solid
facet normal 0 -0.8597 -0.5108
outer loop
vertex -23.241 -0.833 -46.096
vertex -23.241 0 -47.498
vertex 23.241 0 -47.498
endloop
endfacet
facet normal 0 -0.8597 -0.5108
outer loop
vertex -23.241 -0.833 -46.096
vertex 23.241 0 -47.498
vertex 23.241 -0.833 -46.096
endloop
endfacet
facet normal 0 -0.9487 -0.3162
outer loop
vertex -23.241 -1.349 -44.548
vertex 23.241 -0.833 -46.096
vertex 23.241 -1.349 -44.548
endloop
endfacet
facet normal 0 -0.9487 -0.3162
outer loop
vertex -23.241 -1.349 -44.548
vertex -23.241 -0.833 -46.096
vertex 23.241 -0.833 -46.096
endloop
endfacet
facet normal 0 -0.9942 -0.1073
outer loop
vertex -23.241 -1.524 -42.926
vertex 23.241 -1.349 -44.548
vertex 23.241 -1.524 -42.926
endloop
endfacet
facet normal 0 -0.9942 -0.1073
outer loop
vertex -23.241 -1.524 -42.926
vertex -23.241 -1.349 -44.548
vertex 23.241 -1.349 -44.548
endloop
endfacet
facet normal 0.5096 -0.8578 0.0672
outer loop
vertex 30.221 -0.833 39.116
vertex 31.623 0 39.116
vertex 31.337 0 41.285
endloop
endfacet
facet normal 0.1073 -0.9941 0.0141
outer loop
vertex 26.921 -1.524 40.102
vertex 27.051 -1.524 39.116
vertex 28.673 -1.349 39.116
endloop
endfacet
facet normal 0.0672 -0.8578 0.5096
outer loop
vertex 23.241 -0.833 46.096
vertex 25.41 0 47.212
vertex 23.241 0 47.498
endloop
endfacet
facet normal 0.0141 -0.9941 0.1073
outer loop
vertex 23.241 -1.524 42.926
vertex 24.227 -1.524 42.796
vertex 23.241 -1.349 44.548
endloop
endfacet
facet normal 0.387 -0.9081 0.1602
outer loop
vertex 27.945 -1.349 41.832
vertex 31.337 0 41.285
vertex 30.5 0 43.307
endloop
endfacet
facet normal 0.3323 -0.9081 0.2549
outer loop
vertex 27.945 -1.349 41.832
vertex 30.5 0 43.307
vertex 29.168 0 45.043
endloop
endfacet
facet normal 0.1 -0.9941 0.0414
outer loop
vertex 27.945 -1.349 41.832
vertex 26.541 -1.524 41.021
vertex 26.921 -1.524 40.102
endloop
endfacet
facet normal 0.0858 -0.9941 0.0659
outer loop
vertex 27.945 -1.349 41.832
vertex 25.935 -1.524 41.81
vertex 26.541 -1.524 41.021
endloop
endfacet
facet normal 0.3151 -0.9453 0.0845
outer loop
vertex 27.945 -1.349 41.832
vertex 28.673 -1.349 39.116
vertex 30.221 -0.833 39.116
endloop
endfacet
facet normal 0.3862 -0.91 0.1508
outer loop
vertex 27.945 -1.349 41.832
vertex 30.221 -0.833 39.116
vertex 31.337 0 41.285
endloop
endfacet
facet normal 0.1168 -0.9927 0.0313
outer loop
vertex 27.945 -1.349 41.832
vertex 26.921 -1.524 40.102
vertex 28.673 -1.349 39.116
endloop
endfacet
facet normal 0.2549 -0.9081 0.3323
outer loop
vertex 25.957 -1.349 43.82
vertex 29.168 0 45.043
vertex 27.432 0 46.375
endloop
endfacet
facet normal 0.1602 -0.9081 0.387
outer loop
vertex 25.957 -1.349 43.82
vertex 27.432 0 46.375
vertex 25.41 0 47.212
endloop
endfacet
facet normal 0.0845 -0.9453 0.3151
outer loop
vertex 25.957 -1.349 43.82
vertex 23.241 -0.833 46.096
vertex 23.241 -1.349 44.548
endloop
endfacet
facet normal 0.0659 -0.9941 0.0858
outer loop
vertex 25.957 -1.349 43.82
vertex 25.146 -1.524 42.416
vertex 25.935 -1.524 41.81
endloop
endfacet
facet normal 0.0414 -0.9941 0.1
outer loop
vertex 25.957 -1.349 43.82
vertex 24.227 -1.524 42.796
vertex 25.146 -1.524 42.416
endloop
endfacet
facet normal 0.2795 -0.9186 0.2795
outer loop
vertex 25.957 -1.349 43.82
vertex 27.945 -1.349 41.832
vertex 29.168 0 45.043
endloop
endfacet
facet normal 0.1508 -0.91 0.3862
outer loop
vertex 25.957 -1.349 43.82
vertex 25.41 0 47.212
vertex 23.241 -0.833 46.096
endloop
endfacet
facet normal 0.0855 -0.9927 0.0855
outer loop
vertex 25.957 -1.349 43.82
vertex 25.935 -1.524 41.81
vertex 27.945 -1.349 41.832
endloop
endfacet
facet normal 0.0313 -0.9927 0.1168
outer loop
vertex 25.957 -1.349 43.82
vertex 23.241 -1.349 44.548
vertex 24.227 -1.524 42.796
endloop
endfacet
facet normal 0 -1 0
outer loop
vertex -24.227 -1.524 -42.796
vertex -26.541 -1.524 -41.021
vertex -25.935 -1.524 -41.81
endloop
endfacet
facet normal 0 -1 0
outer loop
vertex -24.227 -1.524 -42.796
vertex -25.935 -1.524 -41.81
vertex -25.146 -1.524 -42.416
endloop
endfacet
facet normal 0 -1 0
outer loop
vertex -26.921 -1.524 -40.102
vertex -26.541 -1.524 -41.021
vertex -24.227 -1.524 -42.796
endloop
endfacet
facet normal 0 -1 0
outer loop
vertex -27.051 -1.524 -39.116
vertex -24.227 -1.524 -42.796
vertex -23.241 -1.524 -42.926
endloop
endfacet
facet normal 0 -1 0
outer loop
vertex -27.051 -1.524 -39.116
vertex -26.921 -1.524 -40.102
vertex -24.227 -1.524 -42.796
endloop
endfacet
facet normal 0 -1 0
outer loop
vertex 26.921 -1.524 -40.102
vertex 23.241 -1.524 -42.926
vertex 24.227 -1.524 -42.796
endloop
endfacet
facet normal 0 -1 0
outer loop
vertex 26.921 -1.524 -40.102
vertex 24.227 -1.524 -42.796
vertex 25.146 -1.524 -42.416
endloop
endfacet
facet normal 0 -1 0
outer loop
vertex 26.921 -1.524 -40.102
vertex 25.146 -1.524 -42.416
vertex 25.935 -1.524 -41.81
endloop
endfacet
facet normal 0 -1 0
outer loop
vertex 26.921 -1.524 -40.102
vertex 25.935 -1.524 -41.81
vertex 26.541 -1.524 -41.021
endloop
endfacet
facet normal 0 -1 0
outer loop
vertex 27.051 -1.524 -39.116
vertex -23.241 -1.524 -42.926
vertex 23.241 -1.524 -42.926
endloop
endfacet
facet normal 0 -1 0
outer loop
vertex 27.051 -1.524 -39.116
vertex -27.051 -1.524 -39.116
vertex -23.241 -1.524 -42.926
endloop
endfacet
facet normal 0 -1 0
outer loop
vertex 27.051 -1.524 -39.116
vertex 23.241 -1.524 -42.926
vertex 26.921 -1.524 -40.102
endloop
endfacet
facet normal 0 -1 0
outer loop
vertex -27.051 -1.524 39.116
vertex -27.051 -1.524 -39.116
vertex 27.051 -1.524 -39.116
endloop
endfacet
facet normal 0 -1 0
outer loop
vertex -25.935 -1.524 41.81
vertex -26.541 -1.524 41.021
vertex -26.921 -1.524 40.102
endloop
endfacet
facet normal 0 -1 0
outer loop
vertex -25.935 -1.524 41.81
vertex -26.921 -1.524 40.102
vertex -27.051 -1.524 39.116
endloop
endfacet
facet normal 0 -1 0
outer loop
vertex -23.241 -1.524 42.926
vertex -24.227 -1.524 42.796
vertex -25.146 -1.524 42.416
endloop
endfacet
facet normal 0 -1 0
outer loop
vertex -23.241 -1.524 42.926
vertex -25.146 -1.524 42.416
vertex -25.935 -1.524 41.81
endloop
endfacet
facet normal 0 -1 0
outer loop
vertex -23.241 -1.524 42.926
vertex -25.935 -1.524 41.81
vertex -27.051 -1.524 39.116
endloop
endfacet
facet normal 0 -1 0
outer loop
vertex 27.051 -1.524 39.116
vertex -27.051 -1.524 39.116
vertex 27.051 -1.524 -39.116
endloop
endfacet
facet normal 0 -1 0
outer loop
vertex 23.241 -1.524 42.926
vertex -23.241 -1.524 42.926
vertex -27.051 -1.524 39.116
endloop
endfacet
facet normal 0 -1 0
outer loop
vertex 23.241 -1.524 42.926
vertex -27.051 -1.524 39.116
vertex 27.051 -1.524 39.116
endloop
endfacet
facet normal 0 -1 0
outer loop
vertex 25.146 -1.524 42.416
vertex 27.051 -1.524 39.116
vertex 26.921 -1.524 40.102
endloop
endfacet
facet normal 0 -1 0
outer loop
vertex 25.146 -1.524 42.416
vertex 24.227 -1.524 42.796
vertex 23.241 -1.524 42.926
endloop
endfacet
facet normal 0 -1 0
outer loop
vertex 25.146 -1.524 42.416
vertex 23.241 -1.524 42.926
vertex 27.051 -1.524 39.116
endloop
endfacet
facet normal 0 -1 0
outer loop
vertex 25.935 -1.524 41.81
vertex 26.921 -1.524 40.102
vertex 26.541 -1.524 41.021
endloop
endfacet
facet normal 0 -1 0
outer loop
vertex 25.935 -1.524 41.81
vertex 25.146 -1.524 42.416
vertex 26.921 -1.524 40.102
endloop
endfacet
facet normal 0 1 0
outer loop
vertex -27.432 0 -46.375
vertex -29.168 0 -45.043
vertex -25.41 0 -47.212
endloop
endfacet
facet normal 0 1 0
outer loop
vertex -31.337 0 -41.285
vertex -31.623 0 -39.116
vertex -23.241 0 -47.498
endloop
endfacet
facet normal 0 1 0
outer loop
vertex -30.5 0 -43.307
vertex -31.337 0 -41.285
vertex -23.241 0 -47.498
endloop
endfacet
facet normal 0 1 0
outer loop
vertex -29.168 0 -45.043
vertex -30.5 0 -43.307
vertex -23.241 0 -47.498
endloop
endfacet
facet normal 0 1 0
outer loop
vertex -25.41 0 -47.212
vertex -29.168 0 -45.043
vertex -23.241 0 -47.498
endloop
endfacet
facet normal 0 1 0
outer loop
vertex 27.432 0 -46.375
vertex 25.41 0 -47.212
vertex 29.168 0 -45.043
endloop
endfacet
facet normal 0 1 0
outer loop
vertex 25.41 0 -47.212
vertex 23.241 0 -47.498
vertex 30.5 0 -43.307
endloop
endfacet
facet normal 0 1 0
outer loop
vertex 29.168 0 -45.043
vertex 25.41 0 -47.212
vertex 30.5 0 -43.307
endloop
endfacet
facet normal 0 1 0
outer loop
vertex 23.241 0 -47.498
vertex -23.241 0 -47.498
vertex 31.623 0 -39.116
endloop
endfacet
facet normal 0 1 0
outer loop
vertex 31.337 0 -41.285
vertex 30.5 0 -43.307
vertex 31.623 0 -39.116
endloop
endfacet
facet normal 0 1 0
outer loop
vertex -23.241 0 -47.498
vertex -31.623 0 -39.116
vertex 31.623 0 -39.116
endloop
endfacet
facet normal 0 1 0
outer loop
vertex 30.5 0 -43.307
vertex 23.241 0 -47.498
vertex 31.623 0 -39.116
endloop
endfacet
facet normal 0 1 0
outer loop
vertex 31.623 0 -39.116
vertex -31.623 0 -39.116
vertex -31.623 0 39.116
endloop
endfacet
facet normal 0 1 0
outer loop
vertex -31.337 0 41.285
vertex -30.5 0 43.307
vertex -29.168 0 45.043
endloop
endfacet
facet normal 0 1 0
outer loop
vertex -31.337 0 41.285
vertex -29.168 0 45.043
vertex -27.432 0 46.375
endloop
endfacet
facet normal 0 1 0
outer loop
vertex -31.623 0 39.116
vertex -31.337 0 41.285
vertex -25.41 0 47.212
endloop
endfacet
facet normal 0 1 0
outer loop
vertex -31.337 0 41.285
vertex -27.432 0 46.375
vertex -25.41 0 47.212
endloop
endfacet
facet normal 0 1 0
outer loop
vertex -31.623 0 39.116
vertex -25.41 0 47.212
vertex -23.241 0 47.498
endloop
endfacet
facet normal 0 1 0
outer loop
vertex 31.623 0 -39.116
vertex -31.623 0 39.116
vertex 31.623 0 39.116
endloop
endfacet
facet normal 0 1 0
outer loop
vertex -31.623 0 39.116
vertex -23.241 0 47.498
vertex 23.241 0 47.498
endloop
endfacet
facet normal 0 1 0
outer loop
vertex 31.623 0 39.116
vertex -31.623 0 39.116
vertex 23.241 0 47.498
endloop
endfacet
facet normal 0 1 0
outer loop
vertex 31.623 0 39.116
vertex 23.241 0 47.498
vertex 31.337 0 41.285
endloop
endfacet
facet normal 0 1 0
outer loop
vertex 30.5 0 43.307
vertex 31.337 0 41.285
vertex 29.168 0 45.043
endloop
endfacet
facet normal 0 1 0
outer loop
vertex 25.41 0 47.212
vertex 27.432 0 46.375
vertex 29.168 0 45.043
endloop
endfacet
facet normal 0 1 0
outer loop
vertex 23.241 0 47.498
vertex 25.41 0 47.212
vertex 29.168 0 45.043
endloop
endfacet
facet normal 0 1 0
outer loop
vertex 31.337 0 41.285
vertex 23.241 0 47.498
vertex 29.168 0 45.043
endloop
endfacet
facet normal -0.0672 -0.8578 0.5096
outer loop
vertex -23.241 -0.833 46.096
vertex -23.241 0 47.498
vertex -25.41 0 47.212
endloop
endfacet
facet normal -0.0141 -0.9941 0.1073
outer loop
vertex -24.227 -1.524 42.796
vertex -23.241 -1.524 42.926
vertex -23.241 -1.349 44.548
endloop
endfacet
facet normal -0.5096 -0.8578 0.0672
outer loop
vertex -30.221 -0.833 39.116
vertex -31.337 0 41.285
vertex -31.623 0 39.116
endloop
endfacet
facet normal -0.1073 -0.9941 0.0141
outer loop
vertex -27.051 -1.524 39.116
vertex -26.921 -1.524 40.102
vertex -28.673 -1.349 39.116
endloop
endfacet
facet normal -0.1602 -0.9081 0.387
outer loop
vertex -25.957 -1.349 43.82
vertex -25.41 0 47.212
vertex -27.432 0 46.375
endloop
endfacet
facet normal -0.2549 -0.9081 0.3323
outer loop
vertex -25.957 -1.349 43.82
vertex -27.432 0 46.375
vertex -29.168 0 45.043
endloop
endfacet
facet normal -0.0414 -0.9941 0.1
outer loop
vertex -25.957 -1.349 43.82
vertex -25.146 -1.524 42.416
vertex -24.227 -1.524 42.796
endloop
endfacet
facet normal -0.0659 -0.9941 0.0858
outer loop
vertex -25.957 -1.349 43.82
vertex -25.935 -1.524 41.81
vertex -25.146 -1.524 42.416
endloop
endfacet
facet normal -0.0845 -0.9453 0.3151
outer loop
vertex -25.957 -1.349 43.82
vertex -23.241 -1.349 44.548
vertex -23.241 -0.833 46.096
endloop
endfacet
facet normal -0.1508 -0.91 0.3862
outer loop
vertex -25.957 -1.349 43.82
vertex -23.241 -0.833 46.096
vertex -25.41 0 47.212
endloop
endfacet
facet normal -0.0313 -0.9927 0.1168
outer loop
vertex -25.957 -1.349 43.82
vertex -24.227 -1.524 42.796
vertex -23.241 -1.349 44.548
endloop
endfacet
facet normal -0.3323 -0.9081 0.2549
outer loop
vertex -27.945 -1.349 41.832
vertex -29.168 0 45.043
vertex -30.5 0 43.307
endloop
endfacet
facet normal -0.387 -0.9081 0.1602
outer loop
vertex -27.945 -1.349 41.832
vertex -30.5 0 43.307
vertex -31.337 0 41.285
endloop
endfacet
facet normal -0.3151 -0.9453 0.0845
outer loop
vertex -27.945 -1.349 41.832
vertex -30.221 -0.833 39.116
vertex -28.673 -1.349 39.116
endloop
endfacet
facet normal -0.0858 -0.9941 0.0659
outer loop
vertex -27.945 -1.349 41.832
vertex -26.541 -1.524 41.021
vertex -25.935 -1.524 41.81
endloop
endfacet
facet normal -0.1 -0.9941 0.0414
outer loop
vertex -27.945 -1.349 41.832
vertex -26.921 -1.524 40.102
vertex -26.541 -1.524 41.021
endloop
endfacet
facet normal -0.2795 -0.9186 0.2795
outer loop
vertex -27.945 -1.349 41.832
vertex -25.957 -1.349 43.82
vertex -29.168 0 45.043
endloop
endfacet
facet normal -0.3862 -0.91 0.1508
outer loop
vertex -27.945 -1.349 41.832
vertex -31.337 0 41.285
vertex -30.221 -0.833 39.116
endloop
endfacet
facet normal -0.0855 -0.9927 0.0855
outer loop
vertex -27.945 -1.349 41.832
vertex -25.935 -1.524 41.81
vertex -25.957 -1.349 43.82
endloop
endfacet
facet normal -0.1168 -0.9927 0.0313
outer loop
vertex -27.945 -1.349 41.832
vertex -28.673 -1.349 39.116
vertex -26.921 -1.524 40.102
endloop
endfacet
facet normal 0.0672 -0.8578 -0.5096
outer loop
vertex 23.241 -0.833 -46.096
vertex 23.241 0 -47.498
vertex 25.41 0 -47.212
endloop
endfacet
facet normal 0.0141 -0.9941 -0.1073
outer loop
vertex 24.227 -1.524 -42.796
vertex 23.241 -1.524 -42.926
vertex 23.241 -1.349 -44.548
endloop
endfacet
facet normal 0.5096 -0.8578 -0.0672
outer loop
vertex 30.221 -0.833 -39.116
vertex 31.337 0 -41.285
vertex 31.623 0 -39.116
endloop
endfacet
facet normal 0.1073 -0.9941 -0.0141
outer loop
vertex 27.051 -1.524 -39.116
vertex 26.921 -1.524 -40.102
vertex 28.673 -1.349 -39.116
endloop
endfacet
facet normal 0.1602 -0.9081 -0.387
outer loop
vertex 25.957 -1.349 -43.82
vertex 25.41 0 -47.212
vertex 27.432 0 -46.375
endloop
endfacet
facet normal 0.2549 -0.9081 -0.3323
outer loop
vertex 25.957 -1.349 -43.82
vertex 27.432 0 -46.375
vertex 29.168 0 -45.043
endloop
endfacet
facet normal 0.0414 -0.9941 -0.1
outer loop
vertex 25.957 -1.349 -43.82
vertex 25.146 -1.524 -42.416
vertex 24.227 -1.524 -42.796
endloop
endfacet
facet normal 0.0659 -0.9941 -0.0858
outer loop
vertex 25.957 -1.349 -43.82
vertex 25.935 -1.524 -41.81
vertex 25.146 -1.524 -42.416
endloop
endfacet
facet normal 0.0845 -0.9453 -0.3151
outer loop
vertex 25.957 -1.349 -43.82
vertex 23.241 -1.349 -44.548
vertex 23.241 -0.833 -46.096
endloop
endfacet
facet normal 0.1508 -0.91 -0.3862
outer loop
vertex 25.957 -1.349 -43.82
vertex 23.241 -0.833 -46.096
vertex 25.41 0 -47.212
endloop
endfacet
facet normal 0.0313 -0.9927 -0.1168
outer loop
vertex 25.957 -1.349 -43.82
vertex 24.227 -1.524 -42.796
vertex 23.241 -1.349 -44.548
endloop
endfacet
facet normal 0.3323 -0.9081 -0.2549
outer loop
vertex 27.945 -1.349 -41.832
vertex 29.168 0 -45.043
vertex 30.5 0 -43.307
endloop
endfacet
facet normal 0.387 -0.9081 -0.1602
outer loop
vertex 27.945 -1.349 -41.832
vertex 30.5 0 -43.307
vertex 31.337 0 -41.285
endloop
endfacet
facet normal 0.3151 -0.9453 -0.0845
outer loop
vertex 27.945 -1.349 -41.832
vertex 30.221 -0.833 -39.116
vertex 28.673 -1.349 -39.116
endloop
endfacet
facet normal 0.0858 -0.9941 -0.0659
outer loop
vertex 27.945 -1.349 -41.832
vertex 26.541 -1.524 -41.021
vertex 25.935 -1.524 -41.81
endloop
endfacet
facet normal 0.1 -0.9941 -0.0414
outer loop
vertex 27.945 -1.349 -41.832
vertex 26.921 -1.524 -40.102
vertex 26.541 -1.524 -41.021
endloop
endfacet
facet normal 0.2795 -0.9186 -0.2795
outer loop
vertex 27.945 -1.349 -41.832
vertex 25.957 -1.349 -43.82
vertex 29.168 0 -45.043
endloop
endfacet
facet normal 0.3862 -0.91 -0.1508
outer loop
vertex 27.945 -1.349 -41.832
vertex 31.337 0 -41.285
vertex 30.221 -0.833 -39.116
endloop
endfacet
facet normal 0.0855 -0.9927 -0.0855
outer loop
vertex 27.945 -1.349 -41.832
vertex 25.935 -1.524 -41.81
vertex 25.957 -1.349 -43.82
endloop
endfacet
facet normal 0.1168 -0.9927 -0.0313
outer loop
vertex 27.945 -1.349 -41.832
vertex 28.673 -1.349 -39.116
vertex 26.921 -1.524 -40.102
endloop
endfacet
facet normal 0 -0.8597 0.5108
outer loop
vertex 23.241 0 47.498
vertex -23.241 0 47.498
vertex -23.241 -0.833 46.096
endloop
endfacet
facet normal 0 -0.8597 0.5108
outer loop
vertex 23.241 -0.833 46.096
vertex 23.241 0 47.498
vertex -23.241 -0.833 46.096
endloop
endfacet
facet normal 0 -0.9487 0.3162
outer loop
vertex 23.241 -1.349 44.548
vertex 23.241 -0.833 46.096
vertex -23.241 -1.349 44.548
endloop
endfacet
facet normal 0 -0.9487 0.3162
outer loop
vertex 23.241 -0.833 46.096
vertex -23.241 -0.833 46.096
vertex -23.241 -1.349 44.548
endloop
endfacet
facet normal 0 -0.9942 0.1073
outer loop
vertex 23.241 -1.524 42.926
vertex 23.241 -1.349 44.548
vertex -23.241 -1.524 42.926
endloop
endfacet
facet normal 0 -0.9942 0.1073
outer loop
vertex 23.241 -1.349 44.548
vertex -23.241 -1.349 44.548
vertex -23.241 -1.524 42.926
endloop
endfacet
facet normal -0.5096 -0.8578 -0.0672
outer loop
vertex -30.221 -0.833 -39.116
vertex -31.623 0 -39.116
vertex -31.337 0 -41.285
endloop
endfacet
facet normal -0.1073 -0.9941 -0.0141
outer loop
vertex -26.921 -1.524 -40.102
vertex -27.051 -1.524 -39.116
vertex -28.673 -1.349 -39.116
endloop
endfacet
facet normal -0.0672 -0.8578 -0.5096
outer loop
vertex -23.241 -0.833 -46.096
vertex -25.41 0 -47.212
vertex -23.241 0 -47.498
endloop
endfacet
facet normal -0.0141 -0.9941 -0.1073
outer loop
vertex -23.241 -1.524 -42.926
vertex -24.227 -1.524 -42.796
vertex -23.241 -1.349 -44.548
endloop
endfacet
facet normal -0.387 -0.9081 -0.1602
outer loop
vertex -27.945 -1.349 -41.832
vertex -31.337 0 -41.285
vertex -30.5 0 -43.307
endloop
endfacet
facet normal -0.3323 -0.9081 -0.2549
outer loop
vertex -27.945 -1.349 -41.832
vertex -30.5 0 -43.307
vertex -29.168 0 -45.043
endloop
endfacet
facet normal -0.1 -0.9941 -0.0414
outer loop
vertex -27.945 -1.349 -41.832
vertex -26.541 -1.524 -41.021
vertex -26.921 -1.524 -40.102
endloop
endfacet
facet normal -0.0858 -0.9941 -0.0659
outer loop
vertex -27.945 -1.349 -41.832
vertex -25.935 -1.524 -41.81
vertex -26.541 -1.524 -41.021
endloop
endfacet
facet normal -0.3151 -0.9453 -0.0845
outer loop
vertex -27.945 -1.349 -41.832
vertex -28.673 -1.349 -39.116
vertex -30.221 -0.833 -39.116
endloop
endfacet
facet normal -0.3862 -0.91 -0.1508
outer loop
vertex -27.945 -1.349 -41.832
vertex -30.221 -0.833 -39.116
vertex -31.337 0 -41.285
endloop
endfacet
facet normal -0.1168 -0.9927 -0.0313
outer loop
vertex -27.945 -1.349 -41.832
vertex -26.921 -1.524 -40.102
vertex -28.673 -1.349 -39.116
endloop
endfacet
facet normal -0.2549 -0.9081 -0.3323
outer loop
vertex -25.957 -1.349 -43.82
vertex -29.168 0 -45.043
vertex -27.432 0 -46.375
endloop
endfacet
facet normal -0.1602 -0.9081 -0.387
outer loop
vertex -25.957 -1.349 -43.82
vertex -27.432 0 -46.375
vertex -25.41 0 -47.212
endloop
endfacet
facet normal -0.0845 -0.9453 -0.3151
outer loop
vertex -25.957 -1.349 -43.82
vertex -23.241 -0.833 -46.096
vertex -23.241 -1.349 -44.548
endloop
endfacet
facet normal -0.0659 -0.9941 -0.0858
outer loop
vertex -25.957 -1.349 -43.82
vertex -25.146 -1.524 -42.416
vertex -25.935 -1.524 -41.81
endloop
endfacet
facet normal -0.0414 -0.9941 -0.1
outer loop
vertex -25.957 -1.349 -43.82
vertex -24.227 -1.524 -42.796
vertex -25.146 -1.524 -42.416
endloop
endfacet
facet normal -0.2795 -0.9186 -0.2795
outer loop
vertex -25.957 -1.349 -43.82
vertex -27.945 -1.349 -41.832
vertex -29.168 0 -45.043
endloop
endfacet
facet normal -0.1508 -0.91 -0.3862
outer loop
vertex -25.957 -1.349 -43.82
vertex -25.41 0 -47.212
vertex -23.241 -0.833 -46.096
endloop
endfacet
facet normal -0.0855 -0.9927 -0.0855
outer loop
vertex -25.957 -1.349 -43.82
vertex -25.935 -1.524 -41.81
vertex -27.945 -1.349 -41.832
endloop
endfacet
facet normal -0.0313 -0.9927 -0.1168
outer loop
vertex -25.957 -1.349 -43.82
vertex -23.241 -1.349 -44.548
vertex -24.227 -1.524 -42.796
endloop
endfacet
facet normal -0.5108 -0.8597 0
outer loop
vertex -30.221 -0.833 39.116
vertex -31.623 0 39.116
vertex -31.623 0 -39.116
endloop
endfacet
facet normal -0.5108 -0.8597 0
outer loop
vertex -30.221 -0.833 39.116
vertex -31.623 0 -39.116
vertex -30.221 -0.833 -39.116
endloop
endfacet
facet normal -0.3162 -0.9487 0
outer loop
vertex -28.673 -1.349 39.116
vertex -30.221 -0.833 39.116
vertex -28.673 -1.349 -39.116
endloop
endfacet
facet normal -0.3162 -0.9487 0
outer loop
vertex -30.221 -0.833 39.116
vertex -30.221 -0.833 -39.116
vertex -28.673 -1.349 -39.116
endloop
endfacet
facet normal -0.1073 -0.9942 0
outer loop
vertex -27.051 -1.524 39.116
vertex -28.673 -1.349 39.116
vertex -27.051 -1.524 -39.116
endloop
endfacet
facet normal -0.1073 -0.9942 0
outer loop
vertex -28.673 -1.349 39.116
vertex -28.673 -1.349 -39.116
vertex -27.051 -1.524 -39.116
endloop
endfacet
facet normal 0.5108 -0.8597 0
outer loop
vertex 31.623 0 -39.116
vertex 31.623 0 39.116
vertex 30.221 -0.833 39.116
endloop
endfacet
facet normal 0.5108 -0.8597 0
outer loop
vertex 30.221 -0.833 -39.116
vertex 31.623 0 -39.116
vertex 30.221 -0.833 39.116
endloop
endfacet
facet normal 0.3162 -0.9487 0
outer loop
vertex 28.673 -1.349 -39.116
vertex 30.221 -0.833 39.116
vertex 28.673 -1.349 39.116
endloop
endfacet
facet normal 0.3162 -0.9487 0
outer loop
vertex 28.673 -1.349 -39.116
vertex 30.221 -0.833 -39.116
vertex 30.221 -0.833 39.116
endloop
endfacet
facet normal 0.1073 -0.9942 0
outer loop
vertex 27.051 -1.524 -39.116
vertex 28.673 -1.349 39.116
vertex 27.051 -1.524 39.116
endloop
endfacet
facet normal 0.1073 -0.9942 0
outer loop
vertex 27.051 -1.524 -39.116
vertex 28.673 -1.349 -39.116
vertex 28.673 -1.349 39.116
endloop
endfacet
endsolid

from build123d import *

# Parameters (mm, degrees)
F1_DEPTH     = 1.524
F2_T1_DEPTH  = 78.232
F2_T3_DEPTH  = 46.482
F2_T6_ANGLE  = 90
F2_T8_ANGLE  = 90
F2_T10_ANGLE = 90
F2_T12_ANGLE = 90


# Not quite as in the source:
# - a fillet or chamfer that OpenCascade refuses, or shapes differently, is made with other operations: its cross-section is extruded or revolved along the edge and cut away or added


with BuildPart() as f1:
    # F0 (on Front) → F1 (new body)
    with BuildSketch(Plane.XZ):
        with BuildLine():
            Line((-23.241, -47.498), (23.241, -47.498))
            ThreePointArc((23.241, -47.498), (29.1679690399, -45.0429690399), (31.623, -39.116))
            Line((31.623, -39.116), (31.623, 39.116))
            ThreePointArc((31.623, 39.116), (29.1679690399, 45.0429690399), (23.241, 47.498))
            Line((23.241, 47.498), (-23.241, 47.498))
            ThreePointArc((-23.241, 47.498), (-29.1679690399, 45.0429690399), (-31.623, 39.116))
            Line((-31.623, 39.116), (-31.623, -39.116))
            ThreePointArc((-31.623, -39.116), (-29.1679690399, -45.0429690399), (-23.241, -47.498))
        make_face()
    extrude(amount=F1_DEPTH)

    # F2: fillet of radius 7.62 on 1 edges, made by hand

    # F2_s2 → F2_t1 (cut)
    with BuildSketch(Plane.XY.offset(-39.116)):
        with BuildLine():
            ThreePointArc((-31.623, 0), (-29.460655577, -1.1329667311), (-27.051, -1.524))
            Line((-27.051, -1.524), (-31.623, -1.524))
            Line((-31.623, -1.524), (-31.623, 0))
        make_face()
        with BuildLine():
            ThreePointArc((31.623, 0), (29.460655577, -1.1329667311), (27.051, -1.524))
            Line((27.051, -1.524), (31.623, -1.524))
            Line((31.623, -1.524), (31.623, 0))
        make_face()
    extrude(amount=F2_T1_DEPTH, mode=Mode.SUBTRACT)

    # F2_s4 → F2_t3 (cut)
    with BuildSketch(Plane.YZ.offset(-23.241)):
        with BuildLine():
            ThreePointArc((0, -47.498), (-1.1329667311, -45.335655577), (-1.524, -42.926))
            Line((-1.524, -42.926), (-1.524, -47.498))
            Line((-1.524, -47.498), (0, -47.498))
        make_face()
        with BuildLine():
            ThreePointArc((0, 47.498), (-1.1329667311, 45.335655577), (-1.524, 42.926))
            Line((-1.524, 42.926), (-1.524, 47.498))
            Line((-1.524, 47.498), (0, 47.498))
        make_face()
    extrude(amount=F2_T3_DEPTH, mode=Mode.SUBTRACT)

    # F2_s5 → F2_t6 (revolve, cut)
    with BuildSketch(Plane.YZ.offset(-23.241)):
        with BuildLine():
            ThreePointArc((0, 47.498), (-1.1329667311, 45.335655577), (-1.524, 42.926))
            Line((-1.524, 42.926), (-1.524, 47.498))
            Line((-1.524, 47.498), (0, 47.498))
        make_face()
    revolve(axis=Axis((-23.241, -1.524, 39.116), (0, -1, 0)), revolution_arc=F2_T6_ANGLE, mode=Mode.SUBTRACT)

    # F2_s7 → F2_t8 (revolve, cut)
    with BuildSketch(Plane.XY.offset(-39.116)):
        with BuildLine():
            ThreePointArc((-31.623, 0), (-29.460655577, -1.1329667311), (-27.051, -1.524))
            Line((-27.051, -1.524), (-31.623, -1.524))
            Line((-31.623, -1.524), (-31.623, 0))
        make_face()
    revolve(axis=Axis((-23.241, -1.524, -39.116), (0, -1, 0)), revolution_arc=F2_T8_ANGLE, mode=Mode.SUBTRACT)

    # F2_s9 → F2_t10 (revolve, cut)
    with BuildSketch(Plane.YZ.offset(23.241)):
        with BuildLine():
            ThreePointArc((0, -47.498), (-1.1329667311, -45.335655577), (-1.524, -42.926))
            Line((-1.524, -42.926), (-1.524, -47.498))
            Line((-1.524, -47.498), (0, -47.498))
        make_face()
    revolve(axis=Axis((23.241, -1.524, -39.116), (0, -1, 0)), revolution_arc=F2_T10_ANGLE, mode=Mode.SUBTRACT)

    # F2_s11 → F2_t12 (revolve, cut)
    with BuildSketch(Plane.XY.offset(39.116)):
        with BuildLine():
            ThreePointArc((31.623, 0), (29.460655577, -1.1329667311), (27.051, -1.524))
            Line((27.051, -1.524), (31.623, -1.524))
            Line((31.623, -1.524), (31.623, 0))
        make_face()
    revolve(axis=Axis((23.241, -1.524, 39.116), (0, -1, 0)), revolution_arc=F2_T12_ANGLE, mode=Mode.SUBTRACT)


solid = f1.part
